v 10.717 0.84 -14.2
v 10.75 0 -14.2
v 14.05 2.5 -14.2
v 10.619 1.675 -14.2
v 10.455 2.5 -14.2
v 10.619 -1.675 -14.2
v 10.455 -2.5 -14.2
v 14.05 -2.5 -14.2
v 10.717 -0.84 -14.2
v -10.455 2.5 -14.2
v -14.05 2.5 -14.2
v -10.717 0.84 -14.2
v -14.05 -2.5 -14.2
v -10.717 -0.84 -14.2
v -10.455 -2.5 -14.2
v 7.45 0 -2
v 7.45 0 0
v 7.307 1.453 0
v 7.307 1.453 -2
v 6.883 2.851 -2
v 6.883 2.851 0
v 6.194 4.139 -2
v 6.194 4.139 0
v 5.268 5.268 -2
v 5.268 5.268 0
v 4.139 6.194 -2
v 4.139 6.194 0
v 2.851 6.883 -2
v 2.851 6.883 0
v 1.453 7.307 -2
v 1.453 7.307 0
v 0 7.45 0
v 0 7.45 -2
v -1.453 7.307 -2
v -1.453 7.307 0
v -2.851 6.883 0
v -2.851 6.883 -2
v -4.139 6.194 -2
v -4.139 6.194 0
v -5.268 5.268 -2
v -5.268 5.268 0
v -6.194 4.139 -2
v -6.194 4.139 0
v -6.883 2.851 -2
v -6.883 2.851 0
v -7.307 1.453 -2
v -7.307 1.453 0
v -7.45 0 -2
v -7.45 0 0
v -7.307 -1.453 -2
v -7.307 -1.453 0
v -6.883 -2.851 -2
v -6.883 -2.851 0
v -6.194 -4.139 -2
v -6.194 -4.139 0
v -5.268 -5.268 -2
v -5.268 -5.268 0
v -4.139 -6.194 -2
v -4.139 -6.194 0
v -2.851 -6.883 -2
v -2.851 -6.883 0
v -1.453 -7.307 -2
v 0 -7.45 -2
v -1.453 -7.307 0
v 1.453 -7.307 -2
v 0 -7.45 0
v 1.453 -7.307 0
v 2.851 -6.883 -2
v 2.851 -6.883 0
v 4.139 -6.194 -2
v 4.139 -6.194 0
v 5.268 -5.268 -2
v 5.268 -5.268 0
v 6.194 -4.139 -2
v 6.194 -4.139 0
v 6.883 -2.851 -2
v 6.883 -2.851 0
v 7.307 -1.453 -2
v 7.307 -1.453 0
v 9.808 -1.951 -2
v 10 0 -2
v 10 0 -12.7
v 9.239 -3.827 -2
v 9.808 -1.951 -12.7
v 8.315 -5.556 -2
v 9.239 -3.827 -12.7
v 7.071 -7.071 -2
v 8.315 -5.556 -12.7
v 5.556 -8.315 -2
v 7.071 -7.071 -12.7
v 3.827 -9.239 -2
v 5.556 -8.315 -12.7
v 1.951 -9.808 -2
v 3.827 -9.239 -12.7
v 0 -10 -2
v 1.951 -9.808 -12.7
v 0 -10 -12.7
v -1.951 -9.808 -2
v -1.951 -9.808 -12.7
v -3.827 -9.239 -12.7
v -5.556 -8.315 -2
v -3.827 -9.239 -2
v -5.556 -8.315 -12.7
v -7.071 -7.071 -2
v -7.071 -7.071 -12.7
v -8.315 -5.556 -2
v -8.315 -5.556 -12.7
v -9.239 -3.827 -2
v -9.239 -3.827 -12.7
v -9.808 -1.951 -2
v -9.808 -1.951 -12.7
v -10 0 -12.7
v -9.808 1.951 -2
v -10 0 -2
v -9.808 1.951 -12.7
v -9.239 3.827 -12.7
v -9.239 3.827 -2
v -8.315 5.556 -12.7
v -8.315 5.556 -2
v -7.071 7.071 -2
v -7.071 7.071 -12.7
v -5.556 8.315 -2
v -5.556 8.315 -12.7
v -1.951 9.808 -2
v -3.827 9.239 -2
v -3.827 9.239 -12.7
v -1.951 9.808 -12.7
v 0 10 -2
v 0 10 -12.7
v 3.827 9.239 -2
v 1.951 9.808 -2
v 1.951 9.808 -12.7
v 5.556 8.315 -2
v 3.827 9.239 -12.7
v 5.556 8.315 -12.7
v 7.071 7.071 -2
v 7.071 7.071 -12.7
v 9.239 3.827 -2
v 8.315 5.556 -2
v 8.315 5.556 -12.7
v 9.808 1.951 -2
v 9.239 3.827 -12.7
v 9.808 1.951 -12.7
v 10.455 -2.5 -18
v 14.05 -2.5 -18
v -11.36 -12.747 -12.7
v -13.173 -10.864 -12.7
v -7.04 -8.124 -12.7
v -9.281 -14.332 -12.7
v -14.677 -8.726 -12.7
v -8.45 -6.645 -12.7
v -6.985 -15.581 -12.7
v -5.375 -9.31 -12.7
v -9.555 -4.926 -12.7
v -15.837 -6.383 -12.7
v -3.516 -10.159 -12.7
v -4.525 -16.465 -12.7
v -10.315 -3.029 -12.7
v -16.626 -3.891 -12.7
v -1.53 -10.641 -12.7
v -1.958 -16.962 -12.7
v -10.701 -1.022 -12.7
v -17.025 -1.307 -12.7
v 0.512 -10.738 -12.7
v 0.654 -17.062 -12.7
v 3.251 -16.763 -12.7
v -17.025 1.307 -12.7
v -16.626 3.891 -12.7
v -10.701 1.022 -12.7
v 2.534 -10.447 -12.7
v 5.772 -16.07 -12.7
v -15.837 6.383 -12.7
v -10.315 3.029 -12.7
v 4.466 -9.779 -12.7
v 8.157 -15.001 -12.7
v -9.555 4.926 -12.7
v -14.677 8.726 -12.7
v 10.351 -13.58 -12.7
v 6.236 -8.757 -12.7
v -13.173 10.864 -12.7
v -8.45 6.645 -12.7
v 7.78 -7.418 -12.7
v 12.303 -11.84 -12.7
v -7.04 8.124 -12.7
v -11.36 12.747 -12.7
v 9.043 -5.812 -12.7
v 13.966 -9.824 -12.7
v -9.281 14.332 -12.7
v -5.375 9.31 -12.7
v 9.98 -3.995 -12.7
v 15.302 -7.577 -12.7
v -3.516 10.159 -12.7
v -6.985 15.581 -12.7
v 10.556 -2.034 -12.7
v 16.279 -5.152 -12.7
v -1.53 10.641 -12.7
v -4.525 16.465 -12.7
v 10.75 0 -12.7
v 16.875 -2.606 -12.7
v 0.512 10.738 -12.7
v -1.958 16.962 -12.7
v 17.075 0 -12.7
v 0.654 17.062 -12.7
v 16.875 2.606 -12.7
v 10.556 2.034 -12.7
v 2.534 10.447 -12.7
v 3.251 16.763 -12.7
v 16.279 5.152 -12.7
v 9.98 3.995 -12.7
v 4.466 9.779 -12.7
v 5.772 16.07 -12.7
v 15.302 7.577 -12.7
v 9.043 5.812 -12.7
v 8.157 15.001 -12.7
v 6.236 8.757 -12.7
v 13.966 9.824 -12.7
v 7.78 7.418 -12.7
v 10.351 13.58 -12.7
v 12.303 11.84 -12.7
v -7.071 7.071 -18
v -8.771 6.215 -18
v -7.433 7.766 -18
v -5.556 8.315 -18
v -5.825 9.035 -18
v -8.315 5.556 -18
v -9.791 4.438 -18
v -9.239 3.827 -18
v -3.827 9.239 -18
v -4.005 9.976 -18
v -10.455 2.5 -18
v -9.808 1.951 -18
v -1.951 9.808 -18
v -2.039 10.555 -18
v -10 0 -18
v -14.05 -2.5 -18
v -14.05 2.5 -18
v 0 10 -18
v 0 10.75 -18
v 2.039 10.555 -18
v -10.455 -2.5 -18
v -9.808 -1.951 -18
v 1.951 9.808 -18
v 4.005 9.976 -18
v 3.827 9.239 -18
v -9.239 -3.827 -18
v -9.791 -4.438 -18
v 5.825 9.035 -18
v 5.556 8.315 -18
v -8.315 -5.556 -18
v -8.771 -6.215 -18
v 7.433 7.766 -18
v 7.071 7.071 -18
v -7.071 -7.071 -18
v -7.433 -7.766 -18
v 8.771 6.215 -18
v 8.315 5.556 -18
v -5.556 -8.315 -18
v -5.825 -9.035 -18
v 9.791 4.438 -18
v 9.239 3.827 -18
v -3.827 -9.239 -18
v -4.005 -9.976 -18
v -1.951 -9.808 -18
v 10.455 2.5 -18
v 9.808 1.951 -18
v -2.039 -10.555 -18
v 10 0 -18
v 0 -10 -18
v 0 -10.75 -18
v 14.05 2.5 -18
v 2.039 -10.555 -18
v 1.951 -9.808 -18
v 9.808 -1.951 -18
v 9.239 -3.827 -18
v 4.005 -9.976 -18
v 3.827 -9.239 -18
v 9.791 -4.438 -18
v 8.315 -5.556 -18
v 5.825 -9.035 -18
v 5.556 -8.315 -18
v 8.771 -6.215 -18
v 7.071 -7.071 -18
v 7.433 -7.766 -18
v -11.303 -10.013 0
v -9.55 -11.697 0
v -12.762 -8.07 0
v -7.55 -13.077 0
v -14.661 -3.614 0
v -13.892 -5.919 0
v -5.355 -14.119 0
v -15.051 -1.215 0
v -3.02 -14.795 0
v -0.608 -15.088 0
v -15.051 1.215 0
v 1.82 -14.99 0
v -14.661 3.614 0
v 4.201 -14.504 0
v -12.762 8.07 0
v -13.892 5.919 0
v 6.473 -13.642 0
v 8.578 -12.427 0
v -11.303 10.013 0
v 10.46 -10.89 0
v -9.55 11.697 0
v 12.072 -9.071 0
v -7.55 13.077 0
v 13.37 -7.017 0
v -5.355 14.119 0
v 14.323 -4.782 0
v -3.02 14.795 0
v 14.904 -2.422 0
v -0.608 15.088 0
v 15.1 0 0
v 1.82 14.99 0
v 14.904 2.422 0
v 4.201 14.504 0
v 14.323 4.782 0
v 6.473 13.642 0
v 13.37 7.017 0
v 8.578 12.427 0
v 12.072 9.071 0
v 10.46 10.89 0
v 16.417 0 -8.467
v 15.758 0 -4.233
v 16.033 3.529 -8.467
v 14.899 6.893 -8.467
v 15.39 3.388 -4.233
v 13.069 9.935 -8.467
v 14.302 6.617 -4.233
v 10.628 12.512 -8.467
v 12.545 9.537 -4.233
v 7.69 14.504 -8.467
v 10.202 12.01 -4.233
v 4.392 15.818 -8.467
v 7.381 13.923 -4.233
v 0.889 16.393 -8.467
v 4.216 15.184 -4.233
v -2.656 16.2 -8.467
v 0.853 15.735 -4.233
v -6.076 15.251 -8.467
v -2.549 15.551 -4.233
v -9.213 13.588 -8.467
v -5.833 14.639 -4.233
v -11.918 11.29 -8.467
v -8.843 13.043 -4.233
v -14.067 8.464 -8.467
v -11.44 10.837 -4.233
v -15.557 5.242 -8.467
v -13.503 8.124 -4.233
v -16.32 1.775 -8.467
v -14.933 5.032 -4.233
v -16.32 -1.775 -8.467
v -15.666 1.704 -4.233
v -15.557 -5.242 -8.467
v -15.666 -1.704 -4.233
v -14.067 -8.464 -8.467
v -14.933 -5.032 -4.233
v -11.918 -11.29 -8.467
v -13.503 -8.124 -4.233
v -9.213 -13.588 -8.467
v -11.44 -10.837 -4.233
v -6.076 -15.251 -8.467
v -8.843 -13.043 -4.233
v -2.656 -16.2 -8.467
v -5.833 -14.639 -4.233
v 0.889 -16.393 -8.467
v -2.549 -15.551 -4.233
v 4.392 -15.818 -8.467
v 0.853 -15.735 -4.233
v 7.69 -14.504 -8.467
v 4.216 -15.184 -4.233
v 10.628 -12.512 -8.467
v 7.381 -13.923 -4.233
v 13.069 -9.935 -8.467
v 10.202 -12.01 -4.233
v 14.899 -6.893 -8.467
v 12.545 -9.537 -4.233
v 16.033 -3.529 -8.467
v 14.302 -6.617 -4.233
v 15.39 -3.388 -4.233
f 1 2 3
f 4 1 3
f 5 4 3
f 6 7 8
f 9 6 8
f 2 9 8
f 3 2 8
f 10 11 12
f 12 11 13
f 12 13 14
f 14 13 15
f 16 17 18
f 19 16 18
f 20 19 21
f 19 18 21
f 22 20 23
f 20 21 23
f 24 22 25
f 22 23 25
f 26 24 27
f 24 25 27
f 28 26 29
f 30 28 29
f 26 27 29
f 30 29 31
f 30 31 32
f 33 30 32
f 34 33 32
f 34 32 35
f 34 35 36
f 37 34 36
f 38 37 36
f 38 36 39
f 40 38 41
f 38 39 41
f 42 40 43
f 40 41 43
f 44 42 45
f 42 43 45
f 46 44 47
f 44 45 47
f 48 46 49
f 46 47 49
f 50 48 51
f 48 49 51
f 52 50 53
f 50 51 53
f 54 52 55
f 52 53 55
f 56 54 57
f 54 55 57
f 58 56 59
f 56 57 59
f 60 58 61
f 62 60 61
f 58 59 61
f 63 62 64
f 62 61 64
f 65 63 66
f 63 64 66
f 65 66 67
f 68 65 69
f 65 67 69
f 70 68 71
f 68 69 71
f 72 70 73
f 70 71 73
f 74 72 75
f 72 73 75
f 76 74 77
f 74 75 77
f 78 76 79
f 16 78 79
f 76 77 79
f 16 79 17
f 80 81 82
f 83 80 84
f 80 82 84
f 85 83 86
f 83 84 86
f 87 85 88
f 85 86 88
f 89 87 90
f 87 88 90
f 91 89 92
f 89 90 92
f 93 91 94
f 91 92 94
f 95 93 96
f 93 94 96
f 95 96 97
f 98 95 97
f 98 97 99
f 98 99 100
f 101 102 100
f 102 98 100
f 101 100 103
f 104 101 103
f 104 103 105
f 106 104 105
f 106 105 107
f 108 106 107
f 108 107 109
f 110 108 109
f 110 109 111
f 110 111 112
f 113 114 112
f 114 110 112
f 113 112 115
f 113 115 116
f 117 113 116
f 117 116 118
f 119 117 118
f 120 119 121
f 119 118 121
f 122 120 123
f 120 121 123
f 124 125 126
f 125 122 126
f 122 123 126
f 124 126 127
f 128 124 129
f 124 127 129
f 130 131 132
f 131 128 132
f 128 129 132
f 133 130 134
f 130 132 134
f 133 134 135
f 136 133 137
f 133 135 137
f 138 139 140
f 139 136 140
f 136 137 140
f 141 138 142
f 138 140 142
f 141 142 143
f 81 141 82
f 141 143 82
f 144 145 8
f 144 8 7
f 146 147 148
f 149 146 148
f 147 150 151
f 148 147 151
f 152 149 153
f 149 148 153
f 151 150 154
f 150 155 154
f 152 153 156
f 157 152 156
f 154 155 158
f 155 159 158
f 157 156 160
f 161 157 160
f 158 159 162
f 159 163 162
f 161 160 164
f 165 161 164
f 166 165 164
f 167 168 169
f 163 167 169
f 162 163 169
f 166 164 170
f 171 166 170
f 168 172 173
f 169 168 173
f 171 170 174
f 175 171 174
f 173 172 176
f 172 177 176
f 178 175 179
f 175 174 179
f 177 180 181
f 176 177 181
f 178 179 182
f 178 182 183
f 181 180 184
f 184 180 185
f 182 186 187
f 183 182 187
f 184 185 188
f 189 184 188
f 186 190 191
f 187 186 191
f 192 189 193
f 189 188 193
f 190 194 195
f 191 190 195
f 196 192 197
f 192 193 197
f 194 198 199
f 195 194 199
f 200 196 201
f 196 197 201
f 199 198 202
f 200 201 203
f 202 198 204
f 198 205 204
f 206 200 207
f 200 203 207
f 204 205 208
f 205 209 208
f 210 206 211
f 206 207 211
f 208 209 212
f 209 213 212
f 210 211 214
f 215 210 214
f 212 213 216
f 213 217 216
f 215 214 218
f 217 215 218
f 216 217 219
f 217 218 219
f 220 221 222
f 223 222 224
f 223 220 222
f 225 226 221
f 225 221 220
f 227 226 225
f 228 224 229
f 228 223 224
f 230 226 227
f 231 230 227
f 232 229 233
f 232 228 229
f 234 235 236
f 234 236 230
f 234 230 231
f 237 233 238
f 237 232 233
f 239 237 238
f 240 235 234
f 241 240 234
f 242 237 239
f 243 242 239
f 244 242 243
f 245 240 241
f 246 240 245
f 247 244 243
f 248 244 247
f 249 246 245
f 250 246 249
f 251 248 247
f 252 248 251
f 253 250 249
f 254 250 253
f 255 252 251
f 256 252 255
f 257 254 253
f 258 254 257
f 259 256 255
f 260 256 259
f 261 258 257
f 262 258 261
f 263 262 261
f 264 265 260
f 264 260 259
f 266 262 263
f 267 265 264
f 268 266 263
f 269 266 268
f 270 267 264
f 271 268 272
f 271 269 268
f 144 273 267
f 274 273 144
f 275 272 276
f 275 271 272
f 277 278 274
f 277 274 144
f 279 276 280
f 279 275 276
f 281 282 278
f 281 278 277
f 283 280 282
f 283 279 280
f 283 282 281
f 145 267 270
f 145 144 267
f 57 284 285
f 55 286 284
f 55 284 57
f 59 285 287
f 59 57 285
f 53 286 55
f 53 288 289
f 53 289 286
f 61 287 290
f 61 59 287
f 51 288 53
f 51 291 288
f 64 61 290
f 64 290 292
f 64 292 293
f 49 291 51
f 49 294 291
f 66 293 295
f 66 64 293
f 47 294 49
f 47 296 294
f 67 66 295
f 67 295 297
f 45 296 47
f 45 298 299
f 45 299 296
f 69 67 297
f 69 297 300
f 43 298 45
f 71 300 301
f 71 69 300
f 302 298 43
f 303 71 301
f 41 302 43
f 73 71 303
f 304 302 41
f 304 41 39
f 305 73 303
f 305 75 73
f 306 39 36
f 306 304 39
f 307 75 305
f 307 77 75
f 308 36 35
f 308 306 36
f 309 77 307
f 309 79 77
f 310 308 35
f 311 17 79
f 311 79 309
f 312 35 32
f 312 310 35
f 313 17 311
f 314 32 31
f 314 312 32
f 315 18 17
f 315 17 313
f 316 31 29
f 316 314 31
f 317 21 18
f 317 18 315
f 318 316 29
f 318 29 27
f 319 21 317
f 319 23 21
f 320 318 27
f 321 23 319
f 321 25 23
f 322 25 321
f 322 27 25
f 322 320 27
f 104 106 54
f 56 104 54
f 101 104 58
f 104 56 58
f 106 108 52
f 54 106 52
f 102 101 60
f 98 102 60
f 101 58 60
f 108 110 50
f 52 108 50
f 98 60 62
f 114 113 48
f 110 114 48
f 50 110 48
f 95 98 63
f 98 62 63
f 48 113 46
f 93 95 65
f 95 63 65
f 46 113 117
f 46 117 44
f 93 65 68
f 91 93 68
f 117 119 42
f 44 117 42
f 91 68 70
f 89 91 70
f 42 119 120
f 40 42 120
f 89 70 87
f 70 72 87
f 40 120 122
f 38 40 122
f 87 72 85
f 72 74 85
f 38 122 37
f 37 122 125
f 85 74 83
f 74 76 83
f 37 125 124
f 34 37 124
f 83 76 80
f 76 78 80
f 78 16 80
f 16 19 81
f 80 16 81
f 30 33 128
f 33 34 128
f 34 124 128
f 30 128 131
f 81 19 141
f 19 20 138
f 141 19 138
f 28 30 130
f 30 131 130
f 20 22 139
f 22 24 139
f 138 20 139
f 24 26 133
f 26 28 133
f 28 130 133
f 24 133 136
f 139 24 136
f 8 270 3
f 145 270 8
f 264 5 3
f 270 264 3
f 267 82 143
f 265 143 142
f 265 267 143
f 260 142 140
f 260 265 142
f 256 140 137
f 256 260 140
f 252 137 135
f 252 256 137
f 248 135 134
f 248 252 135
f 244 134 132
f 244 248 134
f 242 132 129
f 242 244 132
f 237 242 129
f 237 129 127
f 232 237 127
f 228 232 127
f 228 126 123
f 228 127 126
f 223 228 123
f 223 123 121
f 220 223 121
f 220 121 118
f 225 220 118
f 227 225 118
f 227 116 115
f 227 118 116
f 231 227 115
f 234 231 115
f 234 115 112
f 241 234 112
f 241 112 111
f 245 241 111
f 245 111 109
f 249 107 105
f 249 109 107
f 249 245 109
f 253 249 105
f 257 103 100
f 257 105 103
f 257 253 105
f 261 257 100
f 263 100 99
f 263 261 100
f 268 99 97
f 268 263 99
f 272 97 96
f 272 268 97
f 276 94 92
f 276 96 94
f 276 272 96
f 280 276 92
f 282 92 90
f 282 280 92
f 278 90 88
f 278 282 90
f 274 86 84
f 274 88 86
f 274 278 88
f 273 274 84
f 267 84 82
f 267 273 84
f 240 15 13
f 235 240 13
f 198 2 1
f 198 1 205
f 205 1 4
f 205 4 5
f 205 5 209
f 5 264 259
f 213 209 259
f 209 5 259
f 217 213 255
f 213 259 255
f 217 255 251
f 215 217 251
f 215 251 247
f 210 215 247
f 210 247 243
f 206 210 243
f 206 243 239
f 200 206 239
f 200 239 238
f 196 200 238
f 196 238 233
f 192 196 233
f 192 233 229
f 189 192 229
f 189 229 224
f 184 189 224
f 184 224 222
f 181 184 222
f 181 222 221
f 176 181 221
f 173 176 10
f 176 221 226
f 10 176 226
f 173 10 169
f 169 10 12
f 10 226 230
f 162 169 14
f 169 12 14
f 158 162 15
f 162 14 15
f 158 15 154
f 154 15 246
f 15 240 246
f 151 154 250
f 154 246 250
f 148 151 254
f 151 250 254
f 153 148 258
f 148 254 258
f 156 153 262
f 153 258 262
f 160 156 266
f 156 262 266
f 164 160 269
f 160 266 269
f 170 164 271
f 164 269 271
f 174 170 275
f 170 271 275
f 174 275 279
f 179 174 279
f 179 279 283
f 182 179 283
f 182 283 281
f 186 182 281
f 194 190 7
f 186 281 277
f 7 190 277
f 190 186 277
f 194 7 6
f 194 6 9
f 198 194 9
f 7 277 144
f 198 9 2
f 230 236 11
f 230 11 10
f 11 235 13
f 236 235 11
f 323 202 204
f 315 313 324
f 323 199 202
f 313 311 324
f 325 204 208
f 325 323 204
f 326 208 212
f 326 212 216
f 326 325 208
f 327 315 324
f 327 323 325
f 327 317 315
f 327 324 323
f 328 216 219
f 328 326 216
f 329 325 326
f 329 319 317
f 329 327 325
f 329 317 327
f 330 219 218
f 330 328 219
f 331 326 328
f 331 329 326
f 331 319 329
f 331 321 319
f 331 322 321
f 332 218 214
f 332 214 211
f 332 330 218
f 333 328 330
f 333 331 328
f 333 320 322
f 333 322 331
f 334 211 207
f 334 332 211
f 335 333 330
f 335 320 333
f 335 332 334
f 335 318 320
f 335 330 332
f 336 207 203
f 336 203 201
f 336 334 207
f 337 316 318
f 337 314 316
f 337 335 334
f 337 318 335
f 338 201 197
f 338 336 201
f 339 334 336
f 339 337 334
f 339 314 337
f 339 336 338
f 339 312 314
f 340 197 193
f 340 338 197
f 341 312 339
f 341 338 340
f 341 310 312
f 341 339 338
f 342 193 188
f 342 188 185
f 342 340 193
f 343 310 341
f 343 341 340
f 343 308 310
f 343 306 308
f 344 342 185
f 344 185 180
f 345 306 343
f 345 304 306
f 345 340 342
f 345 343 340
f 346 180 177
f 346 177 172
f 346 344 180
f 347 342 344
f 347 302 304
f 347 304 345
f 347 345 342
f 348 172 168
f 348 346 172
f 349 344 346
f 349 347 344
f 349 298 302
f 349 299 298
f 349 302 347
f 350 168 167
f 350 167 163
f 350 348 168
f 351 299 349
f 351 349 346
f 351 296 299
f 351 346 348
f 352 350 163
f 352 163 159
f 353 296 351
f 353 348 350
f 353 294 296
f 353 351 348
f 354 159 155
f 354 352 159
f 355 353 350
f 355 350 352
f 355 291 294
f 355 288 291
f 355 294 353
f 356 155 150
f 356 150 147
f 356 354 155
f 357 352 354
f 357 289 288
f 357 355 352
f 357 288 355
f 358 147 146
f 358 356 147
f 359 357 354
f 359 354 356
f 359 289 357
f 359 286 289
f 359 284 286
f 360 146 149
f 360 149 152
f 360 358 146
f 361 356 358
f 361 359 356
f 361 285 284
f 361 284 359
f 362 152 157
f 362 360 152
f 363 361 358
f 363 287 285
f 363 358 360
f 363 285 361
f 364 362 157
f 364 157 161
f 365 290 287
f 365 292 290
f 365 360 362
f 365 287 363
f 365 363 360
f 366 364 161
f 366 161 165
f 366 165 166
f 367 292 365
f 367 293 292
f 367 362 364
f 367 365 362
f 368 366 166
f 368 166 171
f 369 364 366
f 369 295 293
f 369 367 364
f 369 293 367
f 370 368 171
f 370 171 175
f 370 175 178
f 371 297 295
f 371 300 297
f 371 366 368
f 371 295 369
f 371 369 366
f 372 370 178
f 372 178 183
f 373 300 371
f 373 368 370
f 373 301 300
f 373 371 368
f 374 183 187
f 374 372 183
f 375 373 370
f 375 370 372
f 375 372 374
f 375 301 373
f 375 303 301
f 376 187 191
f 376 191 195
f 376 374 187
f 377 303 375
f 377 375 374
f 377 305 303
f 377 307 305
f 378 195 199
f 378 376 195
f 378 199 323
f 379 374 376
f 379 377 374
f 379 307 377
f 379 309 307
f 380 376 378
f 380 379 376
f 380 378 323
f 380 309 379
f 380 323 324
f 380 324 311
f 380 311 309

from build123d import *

# Parameters (mm, degrees)
F2_R      = 17.075
F0_R      = 15.1
F5_R      = 10.75
F5_R_2    = 10
F6_DEPTH  = 18
F7_DEPTH  = 18
F8_R      = 10
F8_R_2    = 7.45
F9_DEPTH  = 2
F11_DEPTH = 3.8


with BuildPart() as f3:
    # F2 (on offset) → F3 section 0
    with BuildSketch(Plane.XY.offset(-12.7)):
        Circle(F2_R)
    # F0 (on Top) → F3 section 1
    with BuildSketch(Plane.XY):
        Circle(F0_R)
    loft()

    # F5 (on offset) → F6 (join)
    with BuildSketch(Plane.XY.offset(-18)):
        Circle(F5_R)
        Circle(F5_R_2, mode=Mode.SUBTRACT)
    extrude(amount=F6_DEPTH)

    # F7 (cut): a face of the model
    f7_faces = [f3.faces().sort_by_distance(p)[0] for p in [
        (0, 0, -12.7),
    ]]
    extrude(f7_faces, amount=-F7_DEPTH, mode=Mode.SUBTRACT)

    # F8 (on Top) → F9 (join)
    with BuildSketch(Plane.XY):
        Circle(F8_R)
        Circle(F8_R_2, mode=Mode.SUBTRACT)
    extrude(amount=-F9_DEPTH)

    # F10 (on face) → F11 (join)
    with BuildSketch(Plane(origin=(0, 0, -18), x_dir=(1, 0, 0), z_dir=(0, 0, -1))):
        with BuildLine():
            Line((-14.05, 2.5), (-14.05, 0))
            Line((-14.05, 0), (-14.05, -2.5))
            Line((-14.05, -2.5), (-10.4552618332, -2.5))
            ThreePointArc((-10.4552618332, -2.5), (-10.75, 0), (-10.4552618332, 2.5))
            Line((-10.4552618332, 2.5), (-14.05, 2.5))
        make_face()
        with BuildLine():
            Line((14.05, 2.5), (10.4552618332, 2.5))
            ThreePointArc((10.4552618332, 2.5), (10.6760611816, 1.2586570807), (10.75, 0))
            ThreePointArc((10.75, 0), (10.6760611816, -1.2586570807), (10.4552618332, -2.5))
            Line((10.4552618332, -2.5), (14.05, -2.5))
            Line((14.05, -2.5), (14.05, 0))
            Line((14.05, 0), (14.05, 2.5))
        make_face()
    extrude(amount=-F11_DEPTH)


solid = f3.part
